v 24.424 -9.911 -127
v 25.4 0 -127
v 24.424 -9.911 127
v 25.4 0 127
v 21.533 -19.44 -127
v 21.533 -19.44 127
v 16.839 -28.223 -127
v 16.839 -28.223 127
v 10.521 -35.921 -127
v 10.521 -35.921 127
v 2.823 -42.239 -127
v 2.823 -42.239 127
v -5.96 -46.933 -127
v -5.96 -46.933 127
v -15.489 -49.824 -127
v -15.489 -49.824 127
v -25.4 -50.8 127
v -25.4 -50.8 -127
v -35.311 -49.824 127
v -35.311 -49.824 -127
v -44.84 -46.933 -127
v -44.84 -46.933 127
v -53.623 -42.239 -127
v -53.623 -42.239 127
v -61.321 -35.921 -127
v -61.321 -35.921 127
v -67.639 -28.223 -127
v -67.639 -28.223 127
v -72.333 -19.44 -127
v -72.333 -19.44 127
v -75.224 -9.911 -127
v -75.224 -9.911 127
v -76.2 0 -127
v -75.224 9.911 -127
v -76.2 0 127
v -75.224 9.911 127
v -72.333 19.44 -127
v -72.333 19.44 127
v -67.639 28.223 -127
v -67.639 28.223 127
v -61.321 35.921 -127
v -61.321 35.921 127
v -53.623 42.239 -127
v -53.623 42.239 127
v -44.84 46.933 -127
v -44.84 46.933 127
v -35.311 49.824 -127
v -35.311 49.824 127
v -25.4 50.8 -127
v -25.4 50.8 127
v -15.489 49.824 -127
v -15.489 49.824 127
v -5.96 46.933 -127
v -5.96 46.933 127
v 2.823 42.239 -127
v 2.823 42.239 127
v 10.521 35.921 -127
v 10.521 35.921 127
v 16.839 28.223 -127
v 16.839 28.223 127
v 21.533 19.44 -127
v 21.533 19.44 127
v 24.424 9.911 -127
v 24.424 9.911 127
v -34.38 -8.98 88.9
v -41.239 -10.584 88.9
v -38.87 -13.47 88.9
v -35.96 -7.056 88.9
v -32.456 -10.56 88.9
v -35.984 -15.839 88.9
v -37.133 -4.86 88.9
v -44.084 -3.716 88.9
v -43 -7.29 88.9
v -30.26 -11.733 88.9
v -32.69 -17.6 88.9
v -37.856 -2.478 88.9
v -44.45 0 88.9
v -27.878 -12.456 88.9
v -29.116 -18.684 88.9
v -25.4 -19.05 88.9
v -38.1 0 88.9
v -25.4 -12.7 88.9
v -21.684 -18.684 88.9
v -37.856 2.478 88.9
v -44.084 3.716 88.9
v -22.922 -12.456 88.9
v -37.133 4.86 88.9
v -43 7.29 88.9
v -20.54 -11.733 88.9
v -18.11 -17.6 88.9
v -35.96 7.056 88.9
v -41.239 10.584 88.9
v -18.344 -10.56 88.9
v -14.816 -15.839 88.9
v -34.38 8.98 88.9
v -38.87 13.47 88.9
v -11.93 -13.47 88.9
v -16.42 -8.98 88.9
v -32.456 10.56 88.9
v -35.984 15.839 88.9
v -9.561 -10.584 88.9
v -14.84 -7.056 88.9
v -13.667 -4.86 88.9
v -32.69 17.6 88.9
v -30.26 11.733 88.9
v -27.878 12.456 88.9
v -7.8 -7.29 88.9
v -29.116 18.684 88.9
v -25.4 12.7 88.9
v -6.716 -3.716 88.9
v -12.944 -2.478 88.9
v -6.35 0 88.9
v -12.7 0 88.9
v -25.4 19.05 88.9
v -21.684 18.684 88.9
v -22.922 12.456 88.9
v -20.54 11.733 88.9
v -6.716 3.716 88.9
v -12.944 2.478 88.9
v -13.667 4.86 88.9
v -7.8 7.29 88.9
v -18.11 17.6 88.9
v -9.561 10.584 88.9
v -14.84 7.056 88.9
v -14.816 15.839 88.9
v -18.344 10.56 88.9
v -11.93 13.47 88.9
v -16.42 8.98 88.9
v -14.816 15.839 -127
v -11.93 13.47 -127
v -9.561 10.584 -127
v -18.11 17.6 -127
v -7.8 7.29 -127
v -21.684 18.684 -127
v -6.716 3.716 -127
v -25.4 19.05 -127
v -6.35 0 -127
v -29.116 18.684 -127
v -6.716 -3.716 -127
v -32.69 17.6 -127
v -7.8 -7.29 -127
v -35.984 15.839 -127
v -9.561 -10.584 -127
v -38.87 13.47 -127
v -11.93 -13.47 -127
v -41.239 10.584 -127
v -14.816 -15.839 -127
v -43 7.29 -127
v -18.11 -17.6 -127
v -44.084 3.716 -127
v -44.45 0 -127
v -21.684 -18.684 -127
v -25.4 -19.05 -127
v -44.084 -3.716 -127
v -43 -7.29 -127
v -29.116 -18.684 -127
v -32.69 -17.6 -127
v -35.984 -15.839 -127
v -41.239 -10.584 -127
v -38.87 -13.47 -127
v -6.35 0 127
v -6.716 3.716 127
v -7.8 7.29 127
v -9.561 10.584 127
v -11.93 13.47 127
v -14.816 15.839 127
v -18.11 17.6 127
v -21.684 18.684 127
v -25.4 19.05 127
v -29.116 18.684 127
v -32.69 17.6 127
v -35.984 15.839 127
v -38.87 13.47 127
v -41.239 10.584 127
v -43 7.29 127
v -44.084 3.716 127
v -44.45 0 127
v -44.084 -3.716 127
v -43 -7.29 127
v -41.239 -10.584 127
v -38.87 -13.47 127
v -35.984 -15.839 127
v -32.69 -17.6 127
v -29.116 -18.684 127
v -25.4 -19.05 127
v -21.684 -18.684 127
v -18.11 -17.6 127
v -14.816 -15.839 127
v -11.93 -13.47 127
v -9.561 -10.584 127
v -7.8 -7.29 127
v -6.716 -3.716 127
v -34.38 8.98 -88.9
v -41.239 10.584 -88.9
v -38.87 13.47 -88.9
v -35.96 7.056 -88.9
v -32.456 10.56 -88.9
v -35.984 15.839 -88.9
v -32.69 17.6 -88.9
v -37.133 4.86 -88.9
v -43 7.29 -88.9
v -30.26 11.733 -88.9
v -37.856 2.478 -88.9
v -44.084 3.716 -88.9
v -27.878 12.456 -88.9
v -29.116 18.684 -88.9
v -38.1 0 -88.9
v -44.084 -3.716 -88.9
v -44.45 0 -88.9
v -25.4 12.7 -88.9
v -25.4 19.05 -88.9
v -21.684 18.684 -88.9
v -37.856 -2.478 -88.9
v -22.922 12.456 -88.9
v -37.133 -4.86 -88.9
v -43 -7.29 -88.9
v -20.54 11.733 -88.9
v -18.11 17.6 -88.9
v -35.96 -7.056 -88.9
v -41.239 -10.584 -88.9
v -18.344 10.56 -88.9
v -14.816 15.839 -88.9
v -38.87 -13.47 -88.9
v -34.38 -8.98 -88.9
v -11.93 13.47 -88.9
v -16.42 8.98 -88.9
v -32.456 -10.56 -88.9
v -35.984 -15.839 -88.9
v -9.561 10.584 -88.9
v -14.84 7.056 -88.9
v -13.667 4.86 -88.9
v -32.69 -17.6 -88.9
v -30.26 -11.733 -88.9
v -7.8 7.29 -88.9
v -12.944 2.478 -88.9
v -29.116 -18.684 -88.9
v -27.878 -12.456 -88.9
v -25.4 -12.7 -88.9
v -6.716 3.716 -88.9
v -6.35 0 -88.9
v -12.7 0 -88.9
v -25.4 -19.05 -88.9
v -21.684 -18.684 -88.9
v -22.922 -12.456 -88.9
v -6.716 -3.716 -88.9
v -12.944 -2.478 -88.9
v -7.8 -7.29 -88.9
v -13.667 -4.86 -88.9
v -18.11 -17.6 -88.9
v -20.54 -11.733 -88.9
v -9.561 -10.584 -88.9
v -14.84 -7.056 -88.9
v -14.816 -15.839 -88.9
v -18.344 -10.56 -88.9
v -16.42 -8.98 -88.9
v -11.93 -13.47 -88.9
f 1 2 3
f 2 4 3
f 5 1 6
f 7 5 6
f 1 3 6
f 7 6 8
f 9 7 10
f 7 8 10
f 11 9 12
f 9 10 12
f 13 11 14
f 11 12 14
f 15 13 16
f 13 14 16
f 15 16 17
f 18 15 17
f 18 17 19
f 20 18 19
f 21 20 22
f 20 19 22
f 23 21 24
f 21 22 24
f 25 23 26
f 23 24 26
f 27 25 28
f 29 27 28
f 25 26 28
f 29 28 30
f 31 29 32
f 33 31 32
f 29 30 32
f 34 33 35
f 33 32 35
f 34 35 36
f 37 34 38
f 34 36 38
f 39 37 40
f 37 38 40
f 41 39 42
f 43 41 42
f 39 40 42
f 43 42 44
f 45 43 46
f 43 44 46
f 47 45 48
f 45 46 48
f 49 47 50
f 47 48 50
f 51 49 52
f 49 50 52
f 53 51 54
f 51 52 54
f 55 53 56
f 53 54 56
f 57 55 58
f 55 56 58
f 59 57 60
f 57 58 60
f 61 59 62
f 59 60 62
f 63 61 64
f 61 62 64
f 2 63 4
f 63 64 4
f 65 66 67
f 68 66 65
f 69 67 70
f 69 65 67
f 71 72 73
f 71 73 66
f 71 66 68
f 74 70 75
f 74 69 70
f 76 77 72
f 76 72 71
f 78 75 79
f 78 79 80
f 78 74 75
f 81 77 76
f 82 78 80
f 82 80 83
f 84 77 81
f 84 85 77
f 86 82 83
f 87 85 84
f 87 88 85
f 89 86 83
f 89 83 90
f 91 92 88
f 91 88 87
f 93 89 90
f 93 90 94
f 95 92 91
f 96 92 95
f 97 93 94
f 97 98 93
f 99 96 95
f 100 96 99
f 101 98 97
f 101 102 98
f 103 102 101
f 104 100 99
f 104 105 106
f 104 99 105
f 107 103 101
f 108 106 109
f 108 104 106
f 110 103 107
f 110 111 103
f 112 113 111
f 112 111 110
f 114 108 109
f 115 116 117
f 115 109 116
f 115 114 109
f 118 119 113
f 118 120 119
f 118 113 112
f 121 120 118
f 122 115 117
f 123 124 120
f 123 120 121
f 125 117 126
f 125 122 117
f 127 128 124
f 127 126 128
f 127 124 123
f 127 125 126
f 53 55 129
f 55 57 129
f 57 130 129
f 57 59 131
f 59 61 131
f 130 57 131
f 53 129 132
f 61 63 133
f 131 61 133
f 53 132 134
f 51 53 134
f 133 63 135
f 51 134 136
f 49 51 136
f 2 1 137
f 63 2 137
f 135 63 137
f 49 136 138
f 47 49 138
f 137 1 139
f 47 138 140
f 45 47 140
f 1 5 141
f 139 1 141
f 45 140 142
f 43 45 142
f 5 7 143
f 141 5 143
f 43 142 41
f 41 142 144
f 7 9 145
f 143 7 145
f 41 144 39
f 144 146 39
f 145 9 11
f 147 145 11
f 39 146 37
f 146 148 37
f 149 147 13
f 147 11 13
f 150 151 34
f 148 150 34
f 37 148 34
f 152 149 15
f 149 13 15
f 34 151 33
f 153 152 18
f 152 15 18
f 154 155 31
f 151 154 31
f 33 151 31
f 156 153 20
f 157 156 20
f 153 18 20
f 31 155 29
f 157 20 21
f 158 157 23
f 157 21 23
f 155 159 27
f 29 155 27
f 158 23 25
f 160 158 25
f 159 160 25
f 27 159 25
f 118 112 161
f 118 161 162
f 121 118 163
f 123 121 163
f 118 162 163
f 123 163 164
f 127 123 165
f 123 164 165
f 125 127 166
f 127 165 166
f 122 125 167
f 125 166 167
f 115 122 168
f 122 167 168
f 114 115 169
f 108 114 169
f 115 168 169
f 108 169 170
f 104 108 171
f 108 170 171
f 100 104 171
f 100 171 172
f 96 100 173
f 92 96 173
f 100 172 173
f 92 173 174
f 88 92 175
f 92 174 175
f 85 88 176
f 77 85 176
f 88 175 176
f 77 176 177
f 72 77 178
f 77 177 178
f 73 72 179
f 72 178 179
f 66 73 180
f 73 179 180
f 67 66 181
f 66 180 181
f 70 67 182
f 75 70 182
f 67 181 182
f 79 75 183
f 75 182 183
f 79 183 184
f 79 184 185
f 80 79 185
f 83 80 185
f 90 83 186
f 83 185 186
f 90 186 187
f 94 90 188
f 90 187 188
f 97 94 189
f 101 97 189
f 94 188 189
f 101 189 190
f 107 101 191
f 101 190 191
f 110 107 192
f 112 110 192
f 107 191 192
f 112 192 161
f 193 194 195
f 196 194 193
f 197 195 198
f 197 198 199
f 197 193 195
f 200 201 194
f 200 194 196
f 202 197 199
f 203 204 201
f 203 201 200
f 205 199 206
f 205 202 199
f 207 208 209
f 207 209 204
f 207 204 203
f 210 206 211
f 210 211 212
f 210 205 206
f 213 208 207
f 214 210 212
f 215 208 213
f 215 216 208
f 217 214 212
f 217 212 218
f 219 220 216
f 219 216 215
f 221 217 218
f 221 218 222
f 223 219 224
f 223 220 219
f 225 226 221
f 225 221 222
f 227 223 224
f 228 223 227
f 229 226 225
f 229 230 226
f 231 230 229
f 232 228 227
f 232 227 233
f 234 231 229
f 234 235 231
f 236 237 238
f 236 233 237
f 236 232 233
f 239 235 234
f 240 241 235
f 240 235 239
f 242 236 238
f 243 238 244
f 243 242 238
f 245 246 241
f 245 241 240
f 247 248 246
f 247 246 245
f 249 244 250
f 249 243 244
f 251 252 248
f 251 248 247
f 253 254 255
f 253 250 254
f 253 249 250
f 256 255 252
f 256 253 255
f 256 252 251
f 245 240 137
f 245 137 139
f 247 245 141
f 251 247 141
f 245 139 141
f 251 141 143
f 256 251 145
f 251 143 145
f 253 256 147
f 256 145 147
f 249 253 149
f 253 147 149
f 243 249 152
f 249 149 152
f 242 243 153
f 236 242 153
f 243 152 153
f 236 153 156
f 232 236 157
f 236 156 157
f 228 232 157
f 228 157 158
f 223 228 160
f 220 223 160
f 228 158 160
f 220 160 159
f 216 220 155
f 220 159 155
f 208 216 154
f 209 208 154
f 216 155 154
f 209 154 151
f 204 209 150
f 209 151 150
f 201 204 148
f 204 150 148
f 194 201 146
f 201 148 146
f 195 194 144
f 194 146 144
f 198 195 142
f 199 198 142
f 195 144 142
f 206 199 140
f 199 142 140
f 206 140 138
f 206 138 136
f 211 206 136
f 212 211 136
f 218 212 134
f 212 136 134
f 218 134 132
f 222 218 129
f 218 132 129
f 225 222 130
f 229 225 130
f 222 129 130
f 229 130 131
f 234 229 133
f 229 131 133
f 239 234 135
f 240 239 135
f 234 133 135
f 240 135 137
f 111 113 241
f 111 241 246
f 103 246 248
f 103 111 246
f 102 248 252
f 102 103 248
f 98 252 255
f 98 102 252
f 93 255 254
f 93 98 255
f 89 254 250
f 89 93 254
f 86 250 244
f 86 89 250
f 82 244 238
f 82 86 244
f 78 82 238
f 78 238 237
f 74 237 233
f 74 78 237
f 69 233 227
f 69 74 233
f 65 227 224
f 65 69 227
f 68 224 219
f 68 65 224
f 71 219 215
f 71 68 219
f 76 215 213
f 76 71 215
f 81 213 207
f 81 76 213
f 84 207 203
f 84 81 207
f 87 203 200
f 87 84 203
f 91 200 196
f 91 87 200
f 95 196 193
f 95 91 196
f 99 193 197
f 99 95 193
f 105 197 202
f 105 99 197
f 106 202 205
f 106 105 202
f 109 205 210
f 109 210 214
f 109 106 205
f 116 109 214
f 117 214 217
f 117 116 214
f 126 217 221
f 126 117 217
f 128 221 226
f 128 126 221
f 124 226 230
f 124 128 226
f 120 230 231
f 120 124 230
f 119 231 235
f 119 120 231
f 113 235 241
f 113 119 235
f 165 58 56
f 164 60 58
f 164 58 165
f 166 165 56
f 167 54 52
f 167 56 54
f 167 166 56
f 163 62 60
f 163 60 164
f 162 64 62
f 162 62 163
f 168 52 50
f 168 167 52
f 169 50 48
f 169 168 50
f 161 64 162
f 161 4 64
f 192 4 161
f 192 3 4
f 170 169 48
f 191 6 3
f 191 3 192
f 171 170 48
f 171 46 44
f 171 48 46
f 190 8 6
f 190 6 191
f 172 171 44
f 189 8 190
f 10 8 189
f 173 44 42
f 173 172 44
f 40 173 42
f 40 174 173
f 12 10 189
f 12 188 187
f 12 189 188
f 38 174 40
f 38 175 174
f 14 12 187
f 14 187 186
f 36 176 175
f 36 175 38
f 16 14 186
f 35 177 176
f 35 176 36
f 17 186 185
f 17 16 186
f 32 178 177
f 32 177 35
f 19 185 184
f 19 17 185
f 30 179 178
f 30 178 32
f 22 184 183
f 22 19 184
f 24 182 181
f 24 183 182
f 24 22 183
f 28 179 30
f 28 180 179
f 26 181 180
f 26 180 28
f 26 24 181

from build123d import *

# Parameters (mm, degrees)
F0_W     = 38.1
F0_H     = 254
F2_R     = 19.05
F2_R_2   = 12.7
F3_DEPTH = 38.1
F4_R     = 19.05
F5_DEPTH = 38.1


with BuildPart() as f1:
    # F0 (on Front) → F1 (revolve)
    with BuildSketch(Plane.XZ):
        with Locations((6.35, 0)):
            Rectangle(F0_W, F0_H)
    revolve(axis=Axis((-25.4, 0, 0), (0, 0, -1)))

    # F2 (on face) → F3 (cut)
    with BuildSketch(Plane(origin=(0, 0, -127), x_dir=(1, 0, 0), z_dir=(0, 0, -1))):
        with Locations((-25.4, 0)):
            Circle(F2_R)
        with Locations((-25.4, 0)):
            Circle(F2_R_2, mode=Mode.SUBTRACT)
    extrude(amount=-F3_DEPTH, mode=Mode.SUBTRACT)

    # F4 (on face) → F5 (cut)
    with BuildSketch(Plane.XY.offset(127)):
        with Locations((-25.4, 0)):
            Circle(F4_R)
    extrude(amount=-F5_DEPTH, mode=Mode.SUBTRACT)


solid = f1.part
